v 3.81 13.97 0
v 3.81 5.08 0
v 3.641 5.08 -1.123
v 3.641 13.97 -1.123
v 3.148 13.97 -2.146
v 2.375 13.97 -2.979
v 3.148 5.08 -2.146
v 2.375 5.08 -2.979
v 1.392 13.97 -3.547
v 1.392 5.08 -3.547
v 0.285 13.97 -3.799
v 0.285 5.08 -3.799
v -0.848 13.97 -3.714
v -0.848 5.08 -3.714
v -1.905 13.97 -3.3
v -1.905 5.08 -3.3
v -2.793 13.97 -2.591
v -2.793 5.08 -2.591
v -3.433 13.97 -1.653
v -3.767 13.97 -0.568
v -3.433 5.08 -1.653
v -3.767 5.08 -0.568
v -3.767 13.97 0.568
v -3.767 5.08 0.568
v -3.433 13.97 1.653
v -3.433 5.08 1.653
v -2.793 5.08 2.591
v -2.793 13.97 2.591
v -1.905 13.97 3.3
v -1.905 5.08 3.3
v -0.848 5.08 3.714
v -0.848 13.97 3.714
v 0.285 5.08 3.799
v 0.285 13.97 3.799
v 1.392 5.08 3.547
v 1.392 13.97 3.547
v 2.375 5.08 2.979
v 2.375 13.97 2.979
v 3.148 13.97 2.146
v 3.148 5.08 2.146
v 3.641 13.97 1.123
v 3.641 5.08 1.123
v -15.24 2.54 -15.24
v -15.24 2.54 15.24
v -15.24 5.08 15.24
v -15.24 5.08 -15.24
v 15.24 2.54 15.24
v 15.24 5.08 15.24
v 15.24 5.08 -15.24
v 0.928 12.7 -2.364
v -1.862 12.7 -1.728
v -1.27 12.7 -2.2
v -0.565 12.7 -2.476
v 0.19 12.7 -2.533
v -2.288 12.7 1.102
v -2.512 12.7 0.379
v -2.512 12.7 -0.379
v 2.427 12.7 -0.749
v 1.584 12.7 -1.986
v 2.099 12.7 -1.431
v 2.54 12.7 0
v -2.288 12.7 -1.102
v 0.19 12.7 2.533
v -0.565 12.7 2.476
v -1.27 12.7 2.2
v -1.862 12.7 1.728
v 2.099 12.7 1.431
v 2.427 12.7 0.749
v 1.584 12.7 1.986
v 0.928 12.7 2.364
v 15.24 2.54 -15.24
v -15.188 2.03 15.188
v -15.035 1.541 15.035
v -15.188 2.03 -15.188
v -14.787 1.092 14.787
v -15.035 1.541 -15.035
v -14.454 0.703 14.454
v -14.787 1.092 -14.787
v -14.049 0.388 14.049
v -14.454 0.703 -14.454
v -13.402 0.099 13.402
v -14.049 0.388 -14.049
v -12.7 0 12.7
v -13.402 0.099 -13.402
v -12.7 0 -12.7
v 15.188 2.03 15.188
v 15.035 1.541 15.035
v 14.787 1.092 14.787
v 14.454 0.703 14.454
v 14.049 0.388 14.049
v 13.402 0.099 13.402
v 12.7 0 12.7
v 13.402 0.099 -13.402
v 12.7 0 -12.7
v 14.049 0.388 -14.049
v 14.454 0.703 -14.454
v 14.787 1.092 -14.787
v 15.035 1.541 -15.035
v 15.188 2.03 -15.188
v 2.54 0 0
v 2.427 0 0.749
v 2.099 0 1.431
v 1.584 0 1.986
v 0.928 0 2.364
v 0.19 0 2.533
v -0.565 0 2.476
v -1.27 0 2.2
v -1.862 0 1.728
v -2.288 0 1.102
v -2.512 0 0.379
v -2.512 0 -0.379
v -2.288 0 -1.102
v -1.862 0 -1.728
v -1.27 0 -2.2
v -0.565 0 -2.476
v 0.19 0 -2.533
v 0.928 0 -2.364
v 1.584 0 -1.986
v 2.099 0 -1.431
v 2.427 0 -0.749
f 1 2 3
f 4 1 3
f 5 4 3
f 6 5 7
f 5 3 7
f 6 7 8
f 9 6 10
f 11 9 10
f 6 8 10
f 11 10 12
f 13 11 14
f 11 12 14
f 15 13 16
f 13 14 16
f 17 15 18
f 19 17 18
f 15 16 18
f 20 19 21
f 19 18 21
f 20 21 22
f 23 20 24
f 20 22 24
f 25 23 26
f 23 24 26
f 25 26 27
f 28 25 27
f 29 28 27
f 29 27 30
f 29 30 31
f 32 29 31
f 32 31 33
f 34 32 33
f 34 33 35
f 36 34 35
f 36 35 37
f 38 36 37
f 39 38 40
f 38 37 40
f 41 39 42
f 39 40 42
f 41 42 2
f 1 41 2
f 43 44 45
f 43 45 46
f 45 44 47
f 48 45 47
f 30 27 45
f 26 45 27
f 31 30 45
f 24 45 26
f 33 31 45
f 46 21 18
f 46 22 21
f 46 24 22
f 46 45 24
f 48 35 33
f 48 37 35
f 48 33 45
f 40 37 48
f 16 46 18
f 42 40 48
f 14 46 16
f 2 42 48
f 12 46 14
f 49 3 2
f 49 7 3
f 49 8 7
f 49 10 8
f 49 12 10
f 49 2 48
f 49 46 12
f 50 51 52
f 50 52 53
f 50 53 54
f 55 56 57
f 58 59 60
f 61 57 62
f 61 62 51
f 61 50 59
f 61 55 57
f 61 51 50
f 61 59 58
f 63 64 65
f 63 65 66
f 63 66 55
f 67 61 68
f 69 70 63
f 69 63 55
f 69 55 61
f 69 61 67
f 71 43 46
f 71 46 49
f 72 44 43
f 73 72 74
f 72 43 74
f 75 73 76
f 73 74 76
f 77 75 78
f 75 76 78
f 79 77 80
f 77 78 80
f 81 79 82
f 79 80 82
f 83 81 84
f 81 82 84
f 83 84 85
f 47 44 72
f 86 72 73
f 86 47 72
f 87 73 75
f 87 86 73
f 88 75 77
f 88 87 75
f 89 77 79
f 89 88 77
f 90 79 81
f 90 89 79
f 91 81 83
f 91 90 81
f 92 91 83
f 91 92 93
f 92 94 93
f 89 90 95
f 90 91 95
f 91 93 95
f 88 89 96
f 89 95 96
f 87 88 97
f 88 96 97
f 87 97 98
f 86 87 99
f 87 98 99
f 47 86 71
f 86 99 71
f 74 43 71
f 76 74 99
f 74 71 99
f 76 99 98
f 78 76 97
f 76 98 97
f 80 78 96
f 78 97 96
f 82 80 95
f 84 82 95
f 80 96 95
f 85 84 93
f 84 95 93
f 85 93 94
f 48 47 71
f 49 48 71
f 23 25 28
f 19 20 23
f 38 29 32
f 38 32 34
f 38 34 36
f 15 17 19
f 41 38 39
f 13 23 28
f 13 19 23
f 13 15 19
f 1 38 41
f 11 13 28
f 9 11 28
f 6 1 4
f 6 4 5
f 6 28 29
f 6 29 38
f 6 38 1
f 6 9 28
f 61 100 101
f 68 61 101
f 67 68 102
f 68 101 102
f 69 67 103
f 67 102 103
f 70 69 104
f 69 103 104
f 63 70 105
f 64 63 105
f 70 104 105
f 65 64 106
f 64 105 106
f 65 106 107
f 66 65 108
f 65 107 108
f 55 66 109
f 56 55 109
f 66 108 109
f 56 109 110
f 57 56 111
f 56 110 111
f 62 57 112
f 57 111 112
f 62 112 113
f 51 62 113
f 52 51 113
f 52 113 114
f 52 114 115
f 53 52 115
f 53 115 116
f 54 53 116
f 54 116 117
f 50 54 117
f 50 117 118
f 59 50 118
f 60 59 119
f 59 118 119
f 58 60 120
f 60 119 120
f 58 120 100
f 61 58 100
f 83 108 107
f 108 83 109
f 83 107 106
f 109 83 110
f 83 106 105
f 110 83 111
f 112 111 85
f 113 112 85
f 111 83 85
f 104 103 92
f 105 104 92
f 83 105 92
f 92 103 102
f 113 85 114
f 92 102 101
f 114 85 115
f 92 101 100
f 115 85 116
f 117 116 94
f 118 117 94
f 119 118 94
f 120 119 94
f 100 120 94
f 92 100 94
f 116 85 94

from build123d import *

# Parameters (mm, degrees)
SKETCH1_W           = 30.48
SKETCH1_H           = 30.48
BOSS_EXTRUDE1_DEPTH = 5.08
SKETCH2_R           = 3.81
BOSS_EXTRUDE2_DEPTH = 8.89
FILLET1_R           = 2.54
SKETCH3_R           = 2.54
CUT_EXTRUDE1_DEPTH  = 12.7


with BuildPart() as part:
    # Sketch1 → Boss-Extrude1 (new body)
    with BuildSketch(Plane(origin=(0, 0, 0), x_dir=(1, 0, 0), z_dir=(0, 1, 0))):
        Rectangle(SKETCH1_W, SKETCH1_H)
    extrude(amount=BOSS_EXTRUDE1_DEPTH)

    # Sketch2 → Boss-Extrude2 (add)
    with BuildSketch(Plane(origin=(0, 5.08, 0), x_dir=(1, 0, 0), z_dir=(0, 1, 0))):
        Circle(SKETCH2_R)
    extrude(amount=BOSS_EXTRUDE2_DEPTH)

    # Fillet1
    fillet1_edges = [part.edges().sort_by_distance(p)[0] for p in [
        (0, 0, 15.24),
        (-15.24, 0, 0),
        (0, 0, -15.24),
        (15.24, 0, 0),
    ]]
    fillet(fillet1_edges, radius=FILLET1_R)

    # Sketch3 → Cut-Extrude1 (cut)
    with BuildSketch(Plane.XZ):
        Circle(SKETCH3_R)
    extrude(amount=-CUT_EXTRUDE1_DEPTH, mode=Mode.SUBTRACT)


solid = part.part
